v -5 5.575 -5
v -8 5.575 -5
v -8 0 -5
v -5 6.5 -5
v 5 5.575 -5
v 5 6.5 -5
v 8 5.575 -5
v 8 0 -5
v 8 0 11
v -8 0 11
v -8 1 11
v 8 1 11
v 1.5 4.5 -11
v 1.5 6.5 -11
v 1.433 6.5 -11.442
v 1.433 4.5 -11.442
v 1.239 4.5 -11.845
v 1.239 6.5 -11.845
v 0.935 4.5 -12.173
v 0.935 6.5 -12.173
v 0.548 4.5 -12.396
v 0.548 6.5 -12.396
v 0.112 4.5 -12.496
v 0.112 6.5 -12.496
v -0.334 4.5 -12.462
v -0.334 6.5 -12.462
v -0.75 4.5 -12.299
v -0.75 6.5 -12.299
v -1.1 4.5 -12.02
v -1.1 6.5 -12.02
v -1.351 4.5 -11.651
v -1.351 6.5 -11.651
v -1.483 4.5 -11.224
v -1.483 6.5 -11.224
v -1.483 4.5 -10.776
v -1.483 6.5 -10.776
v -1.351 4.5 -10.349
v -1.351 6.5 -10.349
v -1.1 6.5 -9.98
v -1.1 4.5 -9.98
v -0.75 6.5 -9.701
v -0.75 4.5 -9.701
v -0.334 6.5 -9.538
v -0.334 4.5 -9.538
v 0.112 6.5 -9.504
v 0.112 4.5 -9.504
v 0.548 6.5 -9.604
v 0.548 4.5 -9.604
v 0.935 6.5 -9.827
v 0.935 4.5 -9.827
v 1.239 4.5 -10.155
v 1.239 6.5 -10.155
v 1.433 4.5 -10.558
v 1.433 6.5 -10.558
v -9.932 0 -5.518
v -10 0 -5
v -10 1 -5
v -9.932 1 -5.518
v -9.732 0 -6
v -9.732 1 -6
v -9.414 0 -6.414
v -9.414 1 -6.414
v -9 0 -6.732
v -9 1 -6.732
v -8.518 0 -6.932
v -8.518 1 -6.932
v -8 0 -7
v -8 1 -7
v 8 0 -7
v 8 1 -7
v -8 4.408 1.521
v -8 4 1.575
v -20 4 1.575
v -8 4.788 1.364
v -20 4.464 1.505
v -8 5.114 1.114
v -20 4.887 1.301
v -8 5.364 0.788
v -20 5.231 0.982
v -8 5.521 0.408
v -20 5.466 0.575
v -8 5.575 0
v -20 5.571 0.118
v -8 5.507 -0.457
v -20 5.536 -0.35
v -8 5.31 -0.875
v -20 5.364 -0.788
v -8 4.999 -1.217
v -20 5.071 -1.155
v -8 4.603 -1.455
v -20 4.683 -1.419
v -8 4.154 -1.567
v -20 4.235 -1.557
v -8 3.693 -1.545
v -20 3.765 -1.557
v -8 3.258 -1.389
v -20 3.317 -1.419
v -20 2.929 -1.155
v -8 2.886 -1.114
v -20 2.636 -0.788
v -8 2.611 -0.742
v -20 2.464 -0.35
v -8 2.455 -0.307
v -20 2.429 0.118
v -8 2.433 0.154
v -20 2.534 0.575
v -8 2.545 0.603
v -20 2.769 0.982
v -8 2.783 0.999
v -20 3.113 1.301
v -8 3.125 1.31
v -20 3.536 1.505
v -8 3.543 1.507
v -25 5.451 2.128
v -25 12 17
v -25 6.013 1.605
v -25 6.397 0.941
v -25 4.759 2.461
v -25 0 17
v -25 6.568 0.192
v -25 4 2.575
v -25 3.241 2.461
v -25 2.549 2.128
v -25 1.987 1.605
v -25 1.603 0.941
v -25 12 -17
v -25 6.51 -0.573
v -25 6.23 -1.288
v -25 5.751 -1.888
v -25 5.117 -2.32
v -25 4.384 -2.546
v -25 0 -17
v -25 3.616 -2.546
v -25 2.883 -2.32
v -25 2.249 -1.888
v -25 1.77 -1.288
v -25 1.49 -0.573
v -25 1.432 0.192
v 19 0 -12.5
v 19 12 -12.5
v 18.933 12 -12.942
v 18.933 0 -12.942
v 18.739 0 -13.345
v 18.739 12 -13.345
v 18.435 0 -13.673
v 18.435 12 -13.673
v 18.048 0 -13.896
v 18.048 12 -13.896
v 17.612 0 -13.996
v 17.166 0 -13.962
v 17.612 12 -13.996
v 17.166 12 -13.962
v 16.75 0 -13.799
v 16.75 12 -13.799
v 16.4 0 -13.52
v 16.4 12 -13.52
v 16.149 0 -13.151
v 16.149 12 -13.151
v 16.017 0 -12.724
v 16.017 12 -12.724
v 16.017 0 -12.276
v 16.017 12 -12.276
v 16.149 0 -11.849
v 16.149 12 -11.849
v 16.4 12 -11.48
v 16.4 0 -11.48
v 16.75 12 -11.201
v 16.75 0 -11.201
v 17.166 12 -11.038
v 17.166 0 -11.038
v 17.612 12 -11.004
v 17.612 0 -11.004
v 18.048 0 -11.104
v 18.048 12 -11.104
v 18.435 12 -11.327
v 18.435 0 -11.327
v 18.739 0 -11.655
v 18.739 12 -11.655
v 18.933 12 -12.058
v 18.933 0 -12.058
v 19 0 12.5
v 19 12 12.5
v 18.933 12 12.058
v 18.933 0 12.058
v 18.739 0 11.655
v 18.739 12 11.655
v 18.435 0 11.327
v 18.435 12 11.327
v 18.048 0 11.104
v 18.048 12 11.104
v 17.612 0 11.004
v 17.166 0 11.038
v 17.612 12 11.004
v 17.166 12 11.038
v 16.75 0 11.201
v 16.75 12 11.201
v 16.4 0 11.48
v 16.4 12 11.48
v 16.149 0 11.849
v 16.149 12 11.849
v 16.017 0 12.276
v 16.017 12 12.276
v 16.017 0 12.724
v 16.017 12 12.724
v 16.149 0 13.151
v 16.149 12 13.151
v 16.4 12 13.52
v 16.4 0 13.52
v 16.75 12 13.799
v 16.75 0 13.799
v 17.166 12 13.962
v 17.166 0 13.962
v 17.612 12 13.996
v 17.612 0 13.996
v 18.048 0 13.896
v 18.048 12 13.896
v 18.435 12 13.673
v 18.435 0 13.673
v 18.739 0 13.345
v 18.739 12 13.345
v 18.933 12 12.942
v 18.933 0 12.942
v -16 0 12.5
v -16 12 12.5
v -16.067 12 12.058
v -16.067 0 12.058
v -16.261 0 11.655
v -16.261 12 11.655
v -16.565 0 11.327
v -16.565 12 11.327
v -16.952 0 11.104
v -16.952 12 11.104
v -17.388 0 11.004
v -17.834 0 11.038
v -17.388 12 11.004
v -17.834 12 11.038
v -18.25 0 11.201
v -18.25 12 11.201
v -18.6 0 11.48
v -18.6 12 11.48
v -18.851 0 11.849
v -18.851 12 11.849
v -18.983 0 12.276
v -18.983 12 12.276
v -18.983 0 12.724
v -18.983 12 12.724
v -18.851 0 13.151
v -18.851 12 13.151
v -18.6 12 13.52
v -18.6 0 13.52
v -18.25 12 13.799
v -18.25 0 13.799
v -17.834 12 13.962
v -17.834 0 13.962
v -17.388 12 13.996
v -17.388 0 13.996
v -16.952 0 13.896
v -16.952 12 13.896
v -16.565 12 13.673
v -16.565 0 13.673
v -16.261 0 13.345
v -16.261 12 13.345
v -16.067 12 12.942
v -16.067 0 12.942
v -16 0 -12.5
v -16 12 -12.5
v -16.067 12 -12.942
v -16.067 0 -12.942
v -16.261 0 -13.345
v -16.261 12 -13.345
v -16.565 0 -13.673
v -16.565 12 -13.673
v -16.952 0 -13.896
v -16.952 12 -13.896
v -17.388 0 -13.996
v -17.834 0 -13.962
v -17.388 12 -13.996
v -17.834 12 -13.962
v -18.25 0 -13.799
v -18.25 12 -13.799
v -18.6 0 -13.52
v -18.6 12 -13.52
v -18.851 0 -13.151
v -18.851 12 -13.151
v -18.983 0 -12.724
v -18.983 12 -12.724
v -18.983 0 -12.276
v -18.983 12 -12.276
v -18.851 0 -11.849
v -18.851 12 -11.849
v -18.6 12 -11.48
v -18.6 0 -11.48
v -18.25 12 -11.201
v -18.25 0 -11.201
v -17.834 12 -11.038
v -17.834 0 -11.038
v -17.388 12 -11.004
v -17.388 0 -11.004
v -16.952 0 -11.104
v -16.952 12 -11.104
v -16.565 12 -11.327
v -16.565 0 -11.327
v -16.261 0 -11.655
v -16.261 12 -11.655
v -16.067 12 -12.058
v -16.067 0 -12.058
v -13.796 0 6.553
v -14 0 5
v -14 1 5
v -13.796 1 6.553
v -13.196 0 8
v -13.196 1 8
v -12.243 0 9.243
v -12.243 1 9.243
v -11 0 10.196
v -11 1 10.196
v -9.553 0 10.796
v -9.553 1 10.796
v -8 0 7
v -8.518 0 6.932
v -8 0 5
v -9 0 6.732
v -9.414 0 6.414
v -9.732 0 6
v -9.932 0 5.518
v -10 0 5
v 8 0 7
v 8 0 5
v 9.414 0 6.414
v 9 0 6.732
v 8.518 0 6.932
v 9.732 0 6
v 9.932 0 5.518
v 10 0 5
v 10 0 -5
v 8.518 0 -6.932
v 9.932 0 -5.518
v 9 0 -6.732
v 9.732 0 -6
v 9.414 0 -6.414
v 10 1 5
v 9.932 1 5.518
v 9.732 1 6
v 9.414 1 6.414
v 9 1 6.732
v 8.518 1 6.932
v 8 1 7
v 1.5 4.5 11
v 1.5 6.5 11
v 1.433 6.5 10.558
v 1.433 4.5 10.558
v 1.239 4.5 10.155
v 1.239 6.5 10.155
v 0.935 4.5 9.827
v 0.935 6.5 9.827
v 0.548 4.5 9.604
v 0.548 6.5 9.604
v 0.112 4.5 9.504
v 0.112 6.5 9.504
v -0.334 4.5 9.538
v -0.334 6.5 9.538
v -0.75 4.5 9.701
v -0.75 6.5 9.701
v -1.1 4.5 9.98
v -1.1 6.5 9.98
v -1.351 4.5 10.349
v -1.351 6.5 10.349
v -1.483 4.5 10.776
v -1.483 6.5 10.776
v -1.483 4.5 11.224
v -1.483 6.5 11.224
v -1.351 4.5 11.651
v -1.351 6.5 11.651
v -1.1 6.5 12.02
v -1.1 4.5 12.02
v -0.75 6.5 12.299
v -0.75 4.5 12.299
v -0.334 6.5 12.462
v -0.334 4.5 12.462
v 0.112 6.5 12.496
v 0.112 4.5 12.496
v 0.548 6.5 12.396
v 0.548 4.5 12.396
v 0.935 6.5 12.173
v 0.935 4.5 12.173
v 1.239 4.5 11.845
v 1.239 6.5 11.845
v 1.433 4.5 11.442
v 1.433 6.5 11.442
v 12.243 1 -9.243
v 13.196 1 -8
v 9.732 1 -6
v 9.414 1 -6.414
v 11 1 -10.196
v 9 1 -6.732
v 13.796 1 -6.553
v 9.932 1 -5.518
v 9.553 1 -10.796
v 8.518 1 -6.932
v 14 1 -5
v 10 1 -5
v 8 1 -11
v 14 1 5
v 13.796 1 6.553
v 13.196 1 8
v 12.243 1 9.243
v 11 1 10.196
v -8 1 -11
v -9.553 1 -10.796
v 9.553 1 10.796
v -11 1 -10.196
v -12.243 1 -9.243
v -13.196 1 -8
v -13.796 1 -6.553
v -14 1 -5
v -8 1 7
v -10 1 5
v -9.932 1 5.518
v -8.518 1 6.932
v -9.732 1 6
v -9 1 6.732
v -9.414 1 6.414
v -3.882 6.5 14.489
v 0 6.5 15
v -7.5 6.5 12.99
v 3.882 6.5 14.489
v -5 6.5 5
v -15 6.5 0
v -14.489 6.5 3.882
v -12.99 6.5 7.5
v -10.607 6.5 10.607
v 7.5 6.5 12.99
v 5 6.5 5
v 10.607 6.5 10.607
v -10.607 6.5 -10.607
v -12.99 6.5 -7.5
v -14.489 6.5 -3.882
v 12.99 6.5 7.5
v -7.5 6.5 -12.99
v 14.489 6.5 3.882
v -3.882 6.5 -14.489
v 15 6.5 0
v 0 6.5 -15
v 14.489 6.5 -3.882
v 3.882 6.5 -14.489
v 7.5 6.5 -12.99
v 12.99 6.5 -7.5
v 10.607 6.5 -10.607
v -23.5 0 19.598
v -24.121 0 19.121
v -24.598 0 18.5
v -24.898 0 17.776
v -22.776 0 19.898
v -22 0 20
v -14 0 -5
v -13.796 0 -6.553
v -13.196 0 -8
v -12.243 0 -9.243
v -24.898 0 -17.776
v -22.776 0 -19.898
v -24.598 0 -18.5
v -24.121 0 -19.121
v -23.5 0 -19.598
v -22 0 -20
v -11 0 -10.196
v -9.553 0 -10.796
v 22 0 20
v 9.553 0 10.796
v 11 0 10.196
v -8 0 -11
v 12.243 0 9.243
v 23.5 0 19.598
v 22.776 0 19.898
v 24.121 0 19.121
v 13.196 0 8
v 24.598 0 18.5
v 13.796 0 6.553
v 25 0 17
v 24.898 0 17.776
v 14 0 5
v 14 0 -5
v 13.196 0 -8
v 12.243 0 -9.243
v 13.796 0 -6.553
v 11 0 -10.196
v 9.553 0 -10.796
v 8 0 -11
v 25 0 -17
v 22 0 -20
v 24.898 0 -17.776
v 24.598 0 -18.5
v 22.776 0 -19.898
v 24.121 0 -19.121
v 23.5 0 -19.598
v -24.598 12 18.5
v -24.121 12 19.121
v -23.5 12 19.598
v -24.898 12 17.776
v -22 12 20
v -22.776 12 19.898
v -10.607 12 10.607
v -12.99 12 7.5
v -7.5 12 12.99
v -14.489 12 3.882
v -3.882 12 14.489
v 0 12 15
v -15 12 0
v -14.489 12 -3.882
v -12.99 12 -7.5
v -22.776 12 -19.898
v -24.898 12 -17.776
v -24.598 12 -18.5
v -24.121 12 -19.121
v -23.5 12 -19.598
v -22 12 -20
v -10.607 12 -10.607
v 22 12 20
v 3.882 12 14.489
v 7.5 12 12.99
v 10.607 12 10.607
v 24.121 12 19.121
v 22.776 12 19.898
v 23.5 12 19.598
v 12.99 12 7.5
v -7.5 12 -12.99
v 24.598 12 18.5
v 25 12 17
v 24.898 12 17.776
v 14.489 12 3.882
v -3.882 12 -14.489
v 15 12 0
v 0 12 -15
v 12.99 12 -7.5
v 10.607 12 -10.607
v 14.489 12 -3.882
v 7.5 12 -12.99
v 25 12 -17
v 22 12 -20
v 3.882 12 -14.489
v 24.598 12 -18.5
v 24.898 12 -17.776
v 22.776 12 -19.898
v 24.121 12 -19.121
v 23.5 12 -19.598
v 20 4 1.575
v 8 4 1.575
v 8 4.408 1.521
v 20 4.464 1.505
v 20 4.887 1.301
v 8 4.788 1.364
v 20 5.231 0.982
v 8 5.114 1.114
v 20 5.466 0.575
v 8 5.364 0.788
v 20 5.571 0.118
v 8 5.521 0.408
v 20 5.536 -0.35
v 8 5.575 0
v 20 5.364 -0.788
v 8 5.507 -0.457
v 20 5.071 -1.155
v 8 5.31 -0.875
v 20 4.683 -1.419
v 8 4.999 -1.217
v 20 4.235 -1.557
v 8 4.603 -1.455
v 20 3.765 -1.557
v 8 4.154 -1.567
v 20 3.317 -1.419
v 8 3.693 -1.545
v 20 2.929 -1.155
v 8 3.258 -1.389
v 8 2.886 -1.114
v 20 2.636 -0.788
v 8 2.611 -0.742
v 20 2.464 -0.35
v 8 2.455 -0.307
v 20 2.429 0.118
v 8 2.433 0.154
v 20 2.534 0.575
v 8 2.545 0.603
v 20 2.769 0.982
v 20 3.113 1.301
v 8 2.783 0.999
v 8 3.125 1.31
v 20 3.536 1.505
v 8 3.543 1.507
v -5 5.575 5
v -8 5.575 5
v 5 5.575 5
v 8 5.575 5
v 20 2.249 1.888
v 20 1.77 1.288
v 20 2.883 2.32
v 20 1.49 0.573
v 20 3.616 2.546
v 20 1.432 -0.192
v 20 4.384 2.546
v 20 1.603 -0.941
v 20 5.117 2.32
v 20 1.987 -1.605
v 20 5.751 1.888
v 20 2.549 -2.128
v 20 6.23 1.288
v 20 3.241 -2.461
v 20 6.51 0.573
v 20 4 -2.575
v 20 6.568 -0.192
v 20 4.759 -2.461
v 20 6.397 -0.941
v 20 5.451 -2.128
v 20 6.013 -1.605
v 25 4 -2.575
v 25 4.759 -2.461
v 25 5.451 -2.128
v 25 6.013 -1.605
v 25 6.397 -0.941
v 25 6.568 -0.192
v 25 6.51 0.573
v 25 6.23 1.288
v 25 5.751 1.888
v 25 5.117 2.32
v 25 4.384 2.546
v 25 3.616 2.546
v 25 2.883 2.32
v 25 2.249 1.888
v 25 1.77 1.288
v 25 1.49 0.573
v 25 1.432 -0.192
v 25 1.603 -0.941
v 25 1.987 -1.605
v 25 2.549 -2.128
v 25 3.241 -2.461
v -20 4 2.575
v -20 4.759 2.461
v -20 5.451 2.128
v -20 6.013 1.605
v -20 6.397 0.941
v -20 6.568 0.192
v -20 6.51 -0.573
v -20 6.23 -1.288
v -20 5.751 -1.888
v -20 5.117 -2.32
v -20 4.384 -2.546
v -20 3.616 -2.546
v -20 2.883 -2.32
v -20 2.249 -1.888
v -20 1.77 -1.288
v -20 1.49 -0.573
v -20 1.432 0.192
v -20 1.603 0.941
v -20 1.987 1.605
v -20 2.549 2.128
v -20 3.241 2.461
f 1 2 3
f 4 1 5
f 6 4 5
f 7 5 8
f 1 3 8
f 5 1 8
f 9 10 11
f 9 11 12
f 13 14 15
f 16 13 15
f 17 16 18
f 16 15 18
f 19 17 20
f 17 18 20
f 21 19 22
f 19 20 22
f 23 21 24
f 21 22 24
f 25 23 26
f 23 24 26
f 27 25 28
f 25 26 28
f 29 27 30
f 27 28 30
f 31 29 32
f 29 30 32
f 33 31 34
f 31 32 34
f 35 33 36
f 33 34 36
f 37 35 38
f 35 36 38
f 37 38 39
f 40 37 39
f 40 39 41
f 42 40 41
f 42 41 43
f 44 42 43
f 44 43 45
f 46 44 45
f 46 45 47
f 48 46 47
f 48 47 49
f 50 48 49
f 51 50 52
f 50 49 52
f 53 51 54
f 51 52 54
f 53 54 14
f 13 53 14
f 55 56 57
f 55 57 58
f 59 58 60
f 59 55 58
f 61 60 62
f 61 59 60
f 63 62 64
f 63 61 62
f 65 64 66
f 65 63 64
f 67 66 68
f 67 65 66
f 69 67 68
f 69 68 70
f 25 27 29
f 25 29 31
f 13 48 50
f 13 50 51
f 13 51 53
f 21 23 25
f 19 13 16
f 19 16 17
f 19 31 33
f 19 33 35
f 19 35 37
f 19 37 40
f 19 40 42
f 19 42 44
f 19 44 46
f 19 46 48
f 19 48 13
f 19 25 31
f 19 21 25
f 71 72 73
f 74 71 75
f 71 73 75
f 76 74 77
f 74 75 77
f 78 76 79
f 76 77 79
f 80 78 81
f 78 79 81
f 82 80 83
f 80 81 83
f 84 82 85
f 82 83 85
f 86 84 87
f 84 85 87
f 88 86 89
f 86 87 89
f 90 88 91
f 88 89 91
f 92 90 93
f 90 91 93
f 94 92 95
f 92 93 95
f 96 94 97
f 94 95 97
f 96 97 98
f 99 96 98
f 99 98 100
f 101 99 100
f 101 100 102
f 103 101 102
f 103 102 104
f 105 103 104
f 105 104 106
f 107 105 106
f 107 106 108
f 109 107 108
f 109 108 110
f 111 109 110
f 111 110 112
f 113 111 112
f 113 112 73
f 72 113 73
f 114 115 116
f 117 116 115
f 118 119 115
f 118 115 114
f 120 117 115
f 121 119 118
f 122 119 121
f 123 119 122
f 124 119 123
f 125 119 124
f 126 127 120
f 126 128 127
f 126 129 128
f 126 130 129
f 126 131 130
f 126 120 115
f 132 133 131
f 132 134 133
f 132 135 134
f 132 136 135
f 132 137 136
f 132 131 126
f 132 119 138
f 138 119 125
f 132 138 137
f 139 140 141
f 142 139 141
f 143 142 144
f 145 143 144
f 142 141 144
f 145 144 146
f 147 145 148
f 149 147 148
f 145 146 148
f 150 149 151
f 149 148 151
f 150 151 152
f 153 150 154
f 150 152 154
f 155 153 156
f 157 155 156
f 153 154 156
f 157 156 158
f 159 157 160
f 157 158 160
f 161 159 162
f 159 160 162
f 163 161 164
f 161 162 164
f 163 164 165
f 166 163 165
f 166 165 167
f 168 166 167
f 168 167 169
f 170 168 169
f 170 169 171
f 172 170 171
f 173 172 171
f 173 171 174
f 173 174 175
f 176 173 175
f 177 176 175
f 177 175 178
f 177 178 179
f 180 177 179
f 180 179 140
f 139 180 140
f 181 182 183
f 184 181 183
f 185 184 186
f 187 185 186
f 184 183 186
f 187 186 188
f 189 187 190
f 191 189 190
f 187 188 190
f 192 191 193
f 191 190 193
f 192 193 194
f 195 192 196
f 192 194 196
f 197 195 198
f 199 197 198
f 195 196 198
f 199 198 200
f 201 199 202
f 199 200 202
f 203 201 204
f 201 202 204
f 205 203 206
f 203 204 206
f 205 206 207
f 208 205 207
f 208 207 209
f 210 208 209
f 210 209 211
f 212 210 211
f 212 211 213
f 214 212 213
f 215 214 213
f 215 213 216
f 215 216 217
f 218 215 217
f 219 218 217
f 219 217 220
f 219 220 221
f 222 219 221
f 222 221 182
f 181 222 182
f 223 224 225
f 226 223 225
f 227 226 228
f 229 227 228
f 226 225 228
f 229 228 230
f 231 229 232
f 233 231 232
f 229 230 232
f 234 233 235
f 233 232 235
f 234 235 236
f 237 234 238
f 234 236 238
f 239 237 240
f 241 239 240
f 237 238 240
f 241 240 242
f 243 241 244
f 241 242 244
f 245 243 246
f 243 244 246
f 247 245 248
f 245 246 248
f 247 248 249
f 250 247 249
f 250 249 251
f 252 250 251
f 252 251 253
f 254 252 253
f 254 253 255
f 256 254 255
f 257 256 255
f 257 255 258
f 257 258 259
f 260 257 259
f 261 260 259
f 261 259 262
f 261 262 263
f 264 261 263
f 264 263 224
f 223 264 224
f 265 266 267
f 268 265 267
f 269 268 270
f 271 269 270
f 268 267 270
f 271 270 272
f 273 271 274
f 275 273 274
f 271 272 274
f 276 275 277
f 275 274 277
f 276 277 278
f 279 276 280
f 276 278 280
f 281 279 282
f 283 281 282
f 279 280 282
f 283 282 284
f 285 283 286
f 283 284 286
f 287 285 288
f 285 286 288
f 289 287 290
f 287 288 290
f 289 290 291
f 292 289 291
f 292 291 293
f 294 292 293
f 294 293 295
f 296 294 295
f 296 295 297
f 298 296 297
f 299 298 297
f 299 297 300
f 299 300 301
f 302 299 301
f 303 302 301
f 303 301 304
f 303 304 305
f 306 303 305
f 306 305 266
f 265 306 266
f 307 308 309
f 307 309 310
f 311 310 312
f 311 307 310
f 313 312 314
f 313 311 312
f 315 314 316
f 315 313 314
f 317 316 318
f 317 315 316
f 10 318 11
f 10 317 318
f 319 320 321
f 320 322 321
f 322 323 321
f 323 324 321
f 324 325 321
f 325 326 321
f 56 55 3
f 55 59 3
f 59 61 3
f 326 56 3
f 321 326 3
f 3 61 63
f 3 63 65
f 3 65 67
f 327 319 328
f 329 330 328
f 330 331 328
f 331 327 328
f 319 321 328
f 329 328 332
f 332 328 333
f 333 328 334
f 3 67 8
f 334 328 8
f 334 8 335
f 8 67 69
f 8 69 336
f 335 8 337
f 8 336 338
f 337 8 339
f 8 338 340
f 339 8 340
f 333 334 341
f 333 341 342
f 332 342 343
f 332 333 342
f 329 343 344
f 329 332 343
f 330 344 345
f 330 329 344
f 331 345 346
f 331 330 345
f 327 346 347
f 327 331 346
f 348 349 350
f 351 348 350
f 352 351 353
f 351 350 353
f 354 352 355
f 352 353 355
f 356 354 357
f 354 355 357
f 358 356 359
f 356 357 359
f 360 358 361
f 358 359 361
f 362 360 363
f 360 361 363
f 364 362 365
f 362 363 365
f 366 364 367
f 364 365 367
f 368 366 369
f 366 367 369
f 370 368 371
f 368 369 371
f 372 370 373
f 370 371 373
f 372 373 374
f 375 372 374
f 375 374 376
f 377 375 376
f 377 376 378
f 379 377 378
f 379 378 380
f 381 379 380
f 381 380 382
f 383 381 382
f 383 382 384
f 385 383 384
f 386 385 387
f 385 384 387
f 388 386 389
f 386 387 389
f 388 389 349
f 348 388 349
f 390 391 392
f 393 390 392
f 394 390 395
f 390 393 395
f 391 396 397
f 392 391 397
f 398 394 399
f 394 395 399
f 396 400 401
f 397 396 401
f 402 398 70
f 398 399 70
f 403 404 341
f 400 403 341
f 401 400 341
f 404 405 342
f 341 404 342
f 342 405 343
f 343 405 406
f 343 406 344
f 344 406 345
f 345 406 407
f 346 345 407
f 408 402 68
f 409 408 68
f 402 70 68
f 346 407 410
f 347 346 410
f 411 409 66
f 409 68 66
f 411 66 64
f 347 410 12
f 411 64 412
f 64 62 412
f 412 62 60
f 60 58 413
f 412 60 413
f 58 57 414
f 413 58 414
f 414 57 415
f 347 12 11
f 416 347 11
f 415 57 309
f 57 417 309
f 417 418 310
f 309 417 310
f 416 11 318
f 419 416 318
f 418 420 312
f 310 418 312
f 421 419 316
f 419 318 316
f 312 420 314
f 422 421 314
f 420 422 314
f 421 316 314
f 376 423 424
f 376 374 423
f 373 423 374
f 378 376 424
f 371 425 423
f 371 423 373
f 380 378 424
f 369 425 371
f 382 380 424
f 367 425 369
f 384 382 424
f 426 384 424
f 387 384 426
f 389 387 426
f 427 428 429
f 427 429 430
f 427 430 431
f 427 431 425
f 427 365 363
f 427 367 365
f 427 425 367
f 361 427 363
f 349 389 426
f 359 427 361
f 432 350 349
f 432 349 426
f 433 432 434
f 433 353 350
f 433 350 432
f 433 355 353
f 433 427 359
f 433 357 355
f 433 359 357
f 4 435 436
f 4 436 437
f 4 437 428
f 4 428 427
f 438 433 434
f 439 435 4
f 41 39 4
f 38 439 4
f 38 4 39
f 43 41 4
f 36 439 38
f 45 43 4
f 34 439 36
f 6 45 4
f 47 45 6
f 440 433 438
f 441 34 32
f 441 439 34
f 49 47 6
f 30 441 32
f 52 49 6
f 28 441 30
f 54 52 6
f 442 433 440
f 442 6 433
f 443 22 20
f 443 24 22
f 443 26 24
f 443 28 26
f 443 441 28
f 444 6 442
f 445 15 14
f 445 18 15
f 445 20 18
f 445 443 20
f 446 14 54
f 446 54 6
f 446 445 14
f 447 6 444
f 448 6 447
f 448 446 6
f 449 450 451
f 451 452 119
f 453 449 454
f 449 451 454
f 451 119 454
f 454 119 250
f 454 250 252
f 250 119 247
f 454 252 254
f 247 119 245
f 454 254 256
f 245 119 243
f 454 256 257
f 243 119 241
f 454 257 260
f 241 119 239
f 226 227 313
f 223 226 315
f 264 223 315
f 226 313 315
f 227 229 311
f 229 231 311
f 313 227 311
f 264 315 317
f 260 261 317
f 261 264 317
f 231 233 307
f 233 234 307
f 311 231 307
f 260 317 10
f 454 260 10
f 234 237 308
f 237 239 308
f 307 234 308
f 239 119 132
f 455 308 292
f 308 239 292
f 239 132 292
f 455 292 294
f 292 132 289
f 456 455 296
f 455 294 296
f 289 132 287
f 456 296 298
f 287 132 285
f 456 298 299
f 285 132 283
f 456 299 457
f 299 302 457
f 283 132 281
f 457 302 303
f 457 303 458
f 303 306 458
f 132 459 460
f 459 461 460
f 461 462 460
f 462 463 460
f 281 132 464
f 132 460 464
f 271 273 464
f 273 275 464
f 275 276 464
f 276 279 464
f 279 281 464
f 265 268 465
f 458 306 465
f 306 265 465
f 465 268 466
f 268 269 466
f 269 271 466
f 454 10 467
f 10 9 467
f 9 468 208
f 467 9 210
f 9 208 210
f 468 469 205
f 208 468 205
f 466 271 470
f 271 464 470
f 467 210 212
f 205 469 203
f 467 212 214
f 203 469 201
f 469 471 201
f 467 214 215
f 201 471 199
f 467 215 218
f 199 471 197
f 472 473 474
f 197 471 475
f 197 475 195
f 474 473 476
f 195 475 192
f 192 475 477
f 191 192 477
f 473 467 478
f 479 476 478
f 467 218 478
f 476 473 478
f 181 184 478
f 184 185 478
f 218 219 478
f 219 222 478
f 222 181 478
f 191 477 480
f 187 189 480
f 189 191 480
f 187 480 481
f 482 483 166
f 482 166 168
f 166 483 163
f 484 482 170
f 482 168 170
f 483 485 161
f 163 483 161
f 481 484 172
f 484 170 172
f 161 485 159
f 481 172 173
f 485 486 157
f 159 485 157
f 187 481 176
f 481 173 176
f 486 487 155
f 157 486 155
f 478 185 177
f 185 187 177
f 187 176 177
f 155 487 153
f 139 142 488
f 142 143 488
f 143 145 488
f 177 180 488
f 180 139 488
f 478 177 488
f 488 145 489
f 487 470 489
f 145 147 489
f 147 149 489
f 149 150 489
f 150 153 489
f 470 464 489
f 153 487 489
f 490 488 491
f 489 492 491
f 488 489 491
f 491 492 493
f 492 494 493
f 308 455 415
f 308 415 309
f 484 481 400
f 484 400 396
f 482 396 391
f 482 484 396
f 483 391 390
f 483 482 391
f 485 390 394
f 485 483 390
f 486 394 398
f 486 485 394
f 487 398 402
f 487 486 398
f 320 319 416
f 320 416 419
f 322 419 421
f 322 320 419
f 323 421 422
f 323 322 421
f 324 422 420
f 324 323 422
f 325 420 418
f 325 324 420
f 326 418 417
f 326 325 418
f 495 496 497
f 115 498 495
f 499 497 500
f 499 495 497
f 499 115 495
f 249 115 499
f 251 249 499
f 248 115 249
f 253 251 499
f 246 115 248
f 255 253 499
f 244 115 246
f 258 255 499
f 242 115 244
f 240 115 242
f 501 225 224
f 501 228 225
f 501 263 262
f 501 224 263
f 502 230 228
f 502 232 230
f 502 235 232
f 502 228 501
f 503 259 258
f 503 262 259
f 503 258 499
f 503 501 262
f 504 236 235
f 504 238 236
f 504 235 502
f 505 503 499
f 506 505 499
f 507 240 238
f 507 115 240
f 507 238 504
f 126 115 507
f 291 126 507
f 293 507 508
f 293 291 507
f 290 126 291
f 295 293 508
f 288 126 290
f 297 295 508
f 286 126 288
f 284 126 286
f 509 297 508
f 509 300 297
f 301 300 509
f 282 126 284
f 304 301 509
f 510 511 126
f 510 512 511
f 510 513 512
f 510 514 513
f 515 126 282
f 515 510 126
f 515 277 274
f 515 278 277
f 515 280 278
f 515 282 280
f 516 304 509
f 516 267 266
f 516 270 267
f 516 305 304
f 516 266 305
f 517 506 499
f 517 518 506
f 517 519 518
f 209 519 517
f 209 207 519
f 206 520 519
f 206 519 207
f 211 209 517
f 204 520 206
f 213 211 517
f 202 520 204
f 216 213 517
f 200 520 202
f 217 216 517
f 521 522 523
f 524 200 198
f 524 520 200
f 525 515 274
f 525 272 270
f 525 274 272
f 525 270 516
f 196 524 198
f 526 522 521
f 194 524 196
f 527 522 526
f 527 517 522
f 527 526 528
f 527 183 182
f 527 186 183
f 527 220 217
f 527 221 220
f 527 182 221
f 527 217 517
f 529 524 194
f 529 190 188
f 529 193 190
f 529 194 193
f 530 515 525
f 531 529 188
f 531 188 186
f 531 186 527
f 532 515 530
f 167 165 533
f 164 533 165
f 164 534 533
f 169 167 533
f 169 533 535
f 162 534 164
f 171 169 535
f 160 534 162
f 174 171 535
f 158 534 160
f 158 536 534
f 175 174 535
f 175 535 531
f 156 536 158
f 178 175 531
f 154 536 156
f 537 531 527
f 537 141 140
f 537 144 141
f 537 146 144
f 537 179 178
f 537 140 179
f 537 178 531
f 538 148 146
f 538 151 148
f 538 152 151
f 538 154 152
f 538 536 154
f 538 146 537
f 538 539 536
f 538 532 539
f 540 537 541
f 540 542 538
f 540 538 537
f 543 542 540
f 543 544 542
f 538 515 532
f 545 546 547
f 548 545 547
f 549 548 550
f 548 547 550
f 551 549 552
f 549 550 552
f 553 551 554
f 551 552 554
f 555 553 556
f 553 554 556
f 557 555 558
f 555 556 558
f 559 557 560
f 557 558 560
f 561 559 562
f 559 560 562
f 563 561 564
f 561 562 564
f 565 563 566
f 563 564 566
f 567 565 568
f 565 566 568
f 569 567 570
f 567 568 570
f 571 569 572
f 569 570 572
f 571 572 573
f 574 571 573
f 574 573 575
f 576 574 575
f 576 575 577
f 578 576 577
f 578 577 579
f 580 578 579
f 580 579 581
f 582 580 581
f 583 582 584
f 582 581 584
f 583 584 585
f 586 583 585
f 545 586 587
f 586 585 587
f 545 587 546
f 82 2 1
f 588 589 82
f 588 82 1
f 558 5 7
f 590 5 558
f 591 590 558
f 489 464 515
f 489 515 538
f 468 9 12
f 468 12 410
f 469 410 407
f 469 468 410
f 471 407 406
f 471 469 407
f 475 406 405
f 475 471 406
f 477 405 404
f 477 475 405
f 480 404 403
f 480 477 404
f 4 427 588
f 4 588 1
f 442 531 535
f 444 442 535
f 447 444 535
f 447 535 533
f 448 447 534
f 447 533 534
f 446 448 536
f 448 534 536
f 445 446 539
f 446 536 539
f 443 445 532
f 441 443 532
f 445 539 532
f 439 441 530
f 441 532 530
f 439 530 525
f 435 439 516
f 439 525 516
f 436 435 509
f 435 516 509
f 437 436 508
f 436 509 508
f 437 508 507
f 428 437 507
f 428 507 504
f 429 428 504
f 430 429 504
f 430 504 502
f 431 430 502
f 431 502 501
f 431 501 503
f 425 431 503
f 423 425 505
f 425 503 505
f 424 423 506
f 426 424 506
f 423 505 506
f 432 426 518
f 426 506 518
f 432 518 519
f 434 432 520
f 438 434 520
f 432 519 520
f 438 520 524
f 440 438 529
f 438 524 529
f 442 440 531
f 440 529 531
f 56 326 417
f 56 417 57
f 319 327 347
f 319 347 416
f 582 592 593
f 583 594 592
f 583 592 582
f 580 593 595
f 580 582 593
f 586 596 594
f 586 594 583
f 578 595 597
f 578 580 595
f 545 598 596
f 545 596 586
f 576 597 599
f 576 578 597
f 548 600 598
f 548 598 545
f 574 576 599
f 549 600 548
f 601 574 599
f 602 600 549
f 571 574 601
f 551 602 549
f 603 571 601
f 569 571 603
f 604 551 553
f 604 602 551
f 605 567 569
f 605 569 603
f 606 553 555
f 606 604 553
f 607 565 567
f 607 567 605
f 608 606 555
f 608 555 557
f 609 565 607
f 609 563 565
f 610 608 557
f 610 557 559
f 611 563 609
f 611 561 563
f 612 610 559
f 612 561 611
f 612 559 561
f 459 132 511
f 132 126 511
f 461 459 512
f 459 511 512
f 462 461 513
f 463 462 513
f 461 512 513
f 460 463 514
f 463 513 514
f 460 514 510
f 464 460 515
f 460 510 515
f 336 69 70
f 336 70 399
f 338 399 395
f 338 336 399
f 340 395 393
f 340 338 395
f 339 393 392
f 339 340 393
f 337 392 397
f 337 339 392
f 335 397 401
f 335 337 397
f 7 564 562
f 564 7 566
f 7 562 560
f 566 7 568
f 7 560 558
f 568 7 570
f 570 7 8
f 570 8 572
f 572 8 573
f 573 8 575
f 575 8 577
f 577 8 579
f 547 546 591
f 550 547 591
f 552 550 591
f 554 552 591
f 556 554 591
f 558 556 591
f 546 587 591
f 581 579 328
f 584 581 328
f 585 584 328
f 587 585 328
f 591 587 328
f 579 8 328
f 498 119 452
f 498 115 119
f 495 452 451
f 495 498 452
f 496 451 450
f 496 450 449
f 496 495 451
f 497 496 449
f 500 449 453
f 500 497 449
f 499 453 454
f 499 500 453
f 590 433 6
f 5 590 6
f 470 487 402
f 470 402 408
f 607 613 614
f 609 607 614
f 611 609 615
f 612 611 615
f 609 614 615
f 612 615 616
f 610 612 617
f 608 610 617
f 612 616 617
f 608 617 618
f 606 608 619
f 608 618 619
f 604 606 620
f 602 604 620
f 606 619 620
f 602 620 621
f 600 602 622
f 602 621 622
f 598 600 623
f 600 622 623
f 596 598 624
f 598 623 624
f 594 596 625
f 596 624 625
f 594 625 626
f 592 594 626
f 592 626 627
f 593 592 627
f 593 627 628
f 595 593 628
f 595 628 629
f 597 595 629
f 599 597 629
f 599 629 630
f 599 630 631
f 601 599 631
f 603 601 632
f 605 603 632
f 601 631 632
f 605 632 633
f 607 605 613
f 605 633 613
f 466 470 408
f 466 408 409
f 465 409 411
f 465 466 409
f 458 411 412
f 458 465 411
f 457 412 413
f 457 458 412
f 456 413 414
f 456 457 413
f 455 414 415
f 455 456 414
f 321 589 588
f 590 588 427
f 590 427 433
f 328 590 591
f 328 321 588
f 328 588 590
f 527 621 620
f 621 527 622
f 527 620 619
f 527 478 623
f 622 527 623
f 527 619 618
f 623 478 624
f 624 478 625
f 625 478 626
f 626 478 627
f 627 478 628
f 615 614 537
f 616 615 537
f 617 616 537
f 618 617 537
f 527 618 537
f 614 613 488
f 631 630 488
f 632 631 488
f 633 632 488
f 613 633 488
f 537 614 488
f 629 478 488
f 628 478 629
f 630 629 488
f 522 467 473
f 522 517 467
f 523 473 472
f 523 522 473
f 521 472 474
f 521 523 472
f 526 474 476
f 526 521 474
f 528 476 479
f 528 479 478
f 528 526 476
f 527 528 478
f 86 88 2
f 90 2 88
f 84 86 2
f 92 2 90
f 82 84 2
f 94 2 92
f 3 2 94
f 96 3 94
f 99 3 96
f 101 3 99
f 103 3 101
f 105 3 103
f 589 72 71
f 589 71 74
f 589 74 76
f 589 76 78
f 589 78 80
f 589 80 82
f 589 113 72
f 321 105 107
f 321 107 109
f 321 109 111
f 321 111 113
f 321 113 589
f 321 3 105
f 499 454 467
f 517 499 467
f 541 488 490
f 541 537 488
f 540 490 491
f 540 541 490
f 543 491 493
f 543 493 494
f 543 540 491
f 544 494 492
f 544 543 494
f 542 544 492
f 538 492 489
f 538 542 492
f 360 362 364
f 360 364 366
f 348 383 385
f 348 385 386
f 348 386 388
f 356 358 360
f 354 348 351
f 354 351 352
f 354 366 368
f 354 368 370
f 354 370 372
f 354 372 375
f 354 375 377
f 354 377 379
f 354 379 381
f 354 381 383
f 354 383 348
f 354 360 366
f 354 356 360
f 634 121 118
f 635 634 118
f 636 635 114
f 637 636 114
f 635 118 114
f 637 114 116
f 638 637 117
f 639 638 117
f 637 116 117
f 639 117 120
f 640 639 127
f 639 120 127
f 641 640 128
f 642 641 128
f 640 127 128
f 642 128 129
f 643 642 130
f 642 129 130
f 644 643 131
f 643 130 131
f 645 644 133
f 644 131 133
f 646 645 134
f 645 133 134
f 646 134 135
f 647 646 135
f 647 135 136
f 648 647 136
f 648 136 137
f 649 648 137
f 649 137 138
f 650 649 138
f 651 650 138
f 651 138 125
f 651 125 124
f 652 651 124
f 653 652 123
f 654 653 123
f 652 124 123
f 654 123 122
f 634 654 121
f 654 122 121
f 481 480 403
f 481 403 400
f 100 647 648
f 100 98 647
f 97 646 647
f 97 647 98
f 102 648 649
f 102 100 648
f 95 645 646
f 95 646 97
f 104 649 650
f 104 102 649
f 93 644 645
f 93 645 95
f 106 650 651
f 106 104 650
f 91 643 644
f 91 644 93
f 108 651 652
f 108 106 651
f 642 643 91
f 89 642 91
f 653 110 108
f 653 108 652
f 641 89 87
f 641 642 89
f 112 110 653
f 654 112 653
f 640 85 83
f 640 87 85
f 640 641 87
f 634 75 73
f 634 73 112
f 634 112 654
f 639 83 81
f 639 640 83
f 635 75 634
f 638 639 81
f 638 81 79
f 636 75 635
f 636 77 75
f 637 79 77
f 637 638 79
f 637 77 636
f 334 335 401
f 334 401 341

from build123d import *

# Parameters (mm, degrees)
SKETCH1_W            = 50
SKETCH1_H            = 40
BODY_DEPTH           = 12
FILLETBODY_R         = 3
SKETCH41_R           = 1.575
CHANNEL1_DEPTH       = 57
SKETCH42_R           = 2.575
INLET_DEPTH          = 5
SKETCH43_R           = 2.575
OUTLET_DEPTH         = 5
SKETCH44_R           = 15
WINDOW_DEPTH         = 5.5
SKETCH45_W           = 16
SKETCH45_H           = 10
FLOWCH_DEPTH         = 5.575
SKETCH46_W           = 10
SKETCH46_H           = 10
WINDOW_HOLE_DEPTH    = 16
SKETCH49_R           = 1.5
FIXHOLES_DEPTH       = 2
GASKET_DEPTH         = 1
SKETCH3_R            = 1.5
BOLT_HOLE_DEPTH      = 10
BOLT_HOLE_DEPTH_BACK = 31


with BuildPart() as part:
    # Sketch1 → Body (new body)
    with BuildSketch(Plane(origin=(0, 0, 0), x_dir=(1, 0, 0), z_dir=(0, 1, 0))):
        Rectangle(SKETCH1_W, SKETCH1_H)
    extrude(amount=BODY_DEPTH)

    # FilletBody
    filletbody_edges = [part.edges().sort_by_distance(p)[0] for p in [
        (-25, 6, -20),
        (25, 6, -20),
        (25, 6, 20),
        (-25, 6, 20),
    ]]
    fillet(filletbody_edges, radius=FILLETBODY_R)

    # Sketch41 → Channel1 (cut)
    with BuildSketch(Plane.ZY.offset(25)):
        with Locations((0, 4)):
            Circle(SKETCH41_R)
    extrude(amount=-CHANNEL1_DEPTH, mode=Mode.SUBTRACT)

    # Sketch42 → Inlet (cut)
    with BuildSketch(Plane.ZY.offset(25)):
        with Locations((0, 4)):
            Circle(SKETCH42_R)
    extrude(amount=-INLET_DEPTH, mode=Mode.SUBTRACT)

    # Sketch43 → Outlet (cut)
    with BuildSketch(Plane(origin=(25, 0, 0), x_dir=(0, 0, -1), z_dir=(1, 0, 0))):
        with Locations((0, 4)):
            Circle(SKETCH43_R)
    extrude(amount=-OUTLET_DEPTH, mode=Mode.SUBTRACT)

    # Sketch44 → Window (cut)
    with BuildSketch(Plane(origin=(0, 12, 0), x_dir=(1, 0, 0), z_dir=(0, 1, 0))):
        Circle(SKETCH44_R)
    extrude(amount=-WINDOW_DEPTH, mode=Mode.SUBTRACT)

    # Sketch45 → FlowCh (cut)
    with BuildSketch(Plane.XZ):
        Rectangle(SKETCH45_W, SKETCH45_H)
    extrude(amount=-FLOWCH_DEPTH, mode=Mode.SUBTRACT)

    # Sketch46 → Window_hole (cut)
    with BuildSketch(Plane(origin=(0, 6.5, 0), x_dir=(1, 0, 0), z_dir=(0, 1, 0))):
        Rectangle(SKETCH46_W, SKETCH46_H)
    extrude(amount=-WINDOW_HOLE_DEPTH, mode=Mode.SUBTRACT)

    # Sketch49 → FixHoles (cut)
    with BuildSketch(Plane(origin=(0, 6.5, 0), x_dir=(1, 0, 0), z_dir=(0, 1, 0))):
        with Locations((0, 11)):
            Circle(SKETCH49_R)
        with Locations((0, -11)):
            Circle(SKETCH49_R)
    extrude(amount=-FIXHOLES_DEPTH, mode=Mode.SUBTRACT)

    # Sketch50 → Gasket (cut)
    with BuildSketch(Plane.XZ):
        with BuildLine():
            ThreePointArc((8, 11), (12.242640687, 9.242640687), (14, 5))
            Line((14, 5), (14, -5))
            ThreePointArc((14, -5), (12.242640687, -9.242640687), (8, -11))
            Line((8, -11), (-8, -11))
            ThreePointArc((-8, -11), (-12.242640687, -9.242640687), (-14, -5))
            Line((-14, -5), (-14, 5))
            ThreePointArc((-14, 5), (-12.242640687, 9.242640687), (-8, 11))
            Line((-8, 11), (8, 11))
        make_face()
        with BuildLine():
            Line((-8, -7), (8, -7))
            ThreePointArc((8, -7), (9.414213562, -6.414213562), (10, -5))
            Line((10, -5), (10, 5))
            ThreePointArc((10, 5), (9.414213562, 6.414213562), (8, 7))
            Line((8, 7), (-8, 7))
            ThreePointArc((-8, 7), (-9.414213562, 6.414213562), (-10, 5))
            Line((-10, 5), (-10, -5))
            ThreePointArc((-10, -5), (-9.414213562, -6.414213562), (-8, -7))
        make_face(mode=Mode.SUBTRACT)
    extrude(amount=-GASKET_DEPTH, mode=Mode.SUBTRACT)

    # Sketch3 → Bolt_hole (cut, two sides)
    with BuildSketch(Plane(origin=(0, 12, 0), x_dir=(1, 0, 0), z_dir=(0, 1, 0))) as bolt_hole_sk:
        with Locations((-17.5, 12.5)):
            Circle(SKETCH3_R)
        with Locations((17.5, 12.5)):
            Circle(SKETCH3_R)
        with Locations((17.5, -12.5)):
            Circle(SKETCH3_R)
        with Locations((-17.5, -12.5)):
            Circle(SKETCH3_R)
    extrude(amount=BOLT_HOLE_DEPTH, mode=Mode.SUBTRACT)
    extrude(bolt_hole_sk.sketch, amount=-BOLT_HOLE_DEPTH_BACK, mode=Mode.SUBTRACT)


solid = part.part
